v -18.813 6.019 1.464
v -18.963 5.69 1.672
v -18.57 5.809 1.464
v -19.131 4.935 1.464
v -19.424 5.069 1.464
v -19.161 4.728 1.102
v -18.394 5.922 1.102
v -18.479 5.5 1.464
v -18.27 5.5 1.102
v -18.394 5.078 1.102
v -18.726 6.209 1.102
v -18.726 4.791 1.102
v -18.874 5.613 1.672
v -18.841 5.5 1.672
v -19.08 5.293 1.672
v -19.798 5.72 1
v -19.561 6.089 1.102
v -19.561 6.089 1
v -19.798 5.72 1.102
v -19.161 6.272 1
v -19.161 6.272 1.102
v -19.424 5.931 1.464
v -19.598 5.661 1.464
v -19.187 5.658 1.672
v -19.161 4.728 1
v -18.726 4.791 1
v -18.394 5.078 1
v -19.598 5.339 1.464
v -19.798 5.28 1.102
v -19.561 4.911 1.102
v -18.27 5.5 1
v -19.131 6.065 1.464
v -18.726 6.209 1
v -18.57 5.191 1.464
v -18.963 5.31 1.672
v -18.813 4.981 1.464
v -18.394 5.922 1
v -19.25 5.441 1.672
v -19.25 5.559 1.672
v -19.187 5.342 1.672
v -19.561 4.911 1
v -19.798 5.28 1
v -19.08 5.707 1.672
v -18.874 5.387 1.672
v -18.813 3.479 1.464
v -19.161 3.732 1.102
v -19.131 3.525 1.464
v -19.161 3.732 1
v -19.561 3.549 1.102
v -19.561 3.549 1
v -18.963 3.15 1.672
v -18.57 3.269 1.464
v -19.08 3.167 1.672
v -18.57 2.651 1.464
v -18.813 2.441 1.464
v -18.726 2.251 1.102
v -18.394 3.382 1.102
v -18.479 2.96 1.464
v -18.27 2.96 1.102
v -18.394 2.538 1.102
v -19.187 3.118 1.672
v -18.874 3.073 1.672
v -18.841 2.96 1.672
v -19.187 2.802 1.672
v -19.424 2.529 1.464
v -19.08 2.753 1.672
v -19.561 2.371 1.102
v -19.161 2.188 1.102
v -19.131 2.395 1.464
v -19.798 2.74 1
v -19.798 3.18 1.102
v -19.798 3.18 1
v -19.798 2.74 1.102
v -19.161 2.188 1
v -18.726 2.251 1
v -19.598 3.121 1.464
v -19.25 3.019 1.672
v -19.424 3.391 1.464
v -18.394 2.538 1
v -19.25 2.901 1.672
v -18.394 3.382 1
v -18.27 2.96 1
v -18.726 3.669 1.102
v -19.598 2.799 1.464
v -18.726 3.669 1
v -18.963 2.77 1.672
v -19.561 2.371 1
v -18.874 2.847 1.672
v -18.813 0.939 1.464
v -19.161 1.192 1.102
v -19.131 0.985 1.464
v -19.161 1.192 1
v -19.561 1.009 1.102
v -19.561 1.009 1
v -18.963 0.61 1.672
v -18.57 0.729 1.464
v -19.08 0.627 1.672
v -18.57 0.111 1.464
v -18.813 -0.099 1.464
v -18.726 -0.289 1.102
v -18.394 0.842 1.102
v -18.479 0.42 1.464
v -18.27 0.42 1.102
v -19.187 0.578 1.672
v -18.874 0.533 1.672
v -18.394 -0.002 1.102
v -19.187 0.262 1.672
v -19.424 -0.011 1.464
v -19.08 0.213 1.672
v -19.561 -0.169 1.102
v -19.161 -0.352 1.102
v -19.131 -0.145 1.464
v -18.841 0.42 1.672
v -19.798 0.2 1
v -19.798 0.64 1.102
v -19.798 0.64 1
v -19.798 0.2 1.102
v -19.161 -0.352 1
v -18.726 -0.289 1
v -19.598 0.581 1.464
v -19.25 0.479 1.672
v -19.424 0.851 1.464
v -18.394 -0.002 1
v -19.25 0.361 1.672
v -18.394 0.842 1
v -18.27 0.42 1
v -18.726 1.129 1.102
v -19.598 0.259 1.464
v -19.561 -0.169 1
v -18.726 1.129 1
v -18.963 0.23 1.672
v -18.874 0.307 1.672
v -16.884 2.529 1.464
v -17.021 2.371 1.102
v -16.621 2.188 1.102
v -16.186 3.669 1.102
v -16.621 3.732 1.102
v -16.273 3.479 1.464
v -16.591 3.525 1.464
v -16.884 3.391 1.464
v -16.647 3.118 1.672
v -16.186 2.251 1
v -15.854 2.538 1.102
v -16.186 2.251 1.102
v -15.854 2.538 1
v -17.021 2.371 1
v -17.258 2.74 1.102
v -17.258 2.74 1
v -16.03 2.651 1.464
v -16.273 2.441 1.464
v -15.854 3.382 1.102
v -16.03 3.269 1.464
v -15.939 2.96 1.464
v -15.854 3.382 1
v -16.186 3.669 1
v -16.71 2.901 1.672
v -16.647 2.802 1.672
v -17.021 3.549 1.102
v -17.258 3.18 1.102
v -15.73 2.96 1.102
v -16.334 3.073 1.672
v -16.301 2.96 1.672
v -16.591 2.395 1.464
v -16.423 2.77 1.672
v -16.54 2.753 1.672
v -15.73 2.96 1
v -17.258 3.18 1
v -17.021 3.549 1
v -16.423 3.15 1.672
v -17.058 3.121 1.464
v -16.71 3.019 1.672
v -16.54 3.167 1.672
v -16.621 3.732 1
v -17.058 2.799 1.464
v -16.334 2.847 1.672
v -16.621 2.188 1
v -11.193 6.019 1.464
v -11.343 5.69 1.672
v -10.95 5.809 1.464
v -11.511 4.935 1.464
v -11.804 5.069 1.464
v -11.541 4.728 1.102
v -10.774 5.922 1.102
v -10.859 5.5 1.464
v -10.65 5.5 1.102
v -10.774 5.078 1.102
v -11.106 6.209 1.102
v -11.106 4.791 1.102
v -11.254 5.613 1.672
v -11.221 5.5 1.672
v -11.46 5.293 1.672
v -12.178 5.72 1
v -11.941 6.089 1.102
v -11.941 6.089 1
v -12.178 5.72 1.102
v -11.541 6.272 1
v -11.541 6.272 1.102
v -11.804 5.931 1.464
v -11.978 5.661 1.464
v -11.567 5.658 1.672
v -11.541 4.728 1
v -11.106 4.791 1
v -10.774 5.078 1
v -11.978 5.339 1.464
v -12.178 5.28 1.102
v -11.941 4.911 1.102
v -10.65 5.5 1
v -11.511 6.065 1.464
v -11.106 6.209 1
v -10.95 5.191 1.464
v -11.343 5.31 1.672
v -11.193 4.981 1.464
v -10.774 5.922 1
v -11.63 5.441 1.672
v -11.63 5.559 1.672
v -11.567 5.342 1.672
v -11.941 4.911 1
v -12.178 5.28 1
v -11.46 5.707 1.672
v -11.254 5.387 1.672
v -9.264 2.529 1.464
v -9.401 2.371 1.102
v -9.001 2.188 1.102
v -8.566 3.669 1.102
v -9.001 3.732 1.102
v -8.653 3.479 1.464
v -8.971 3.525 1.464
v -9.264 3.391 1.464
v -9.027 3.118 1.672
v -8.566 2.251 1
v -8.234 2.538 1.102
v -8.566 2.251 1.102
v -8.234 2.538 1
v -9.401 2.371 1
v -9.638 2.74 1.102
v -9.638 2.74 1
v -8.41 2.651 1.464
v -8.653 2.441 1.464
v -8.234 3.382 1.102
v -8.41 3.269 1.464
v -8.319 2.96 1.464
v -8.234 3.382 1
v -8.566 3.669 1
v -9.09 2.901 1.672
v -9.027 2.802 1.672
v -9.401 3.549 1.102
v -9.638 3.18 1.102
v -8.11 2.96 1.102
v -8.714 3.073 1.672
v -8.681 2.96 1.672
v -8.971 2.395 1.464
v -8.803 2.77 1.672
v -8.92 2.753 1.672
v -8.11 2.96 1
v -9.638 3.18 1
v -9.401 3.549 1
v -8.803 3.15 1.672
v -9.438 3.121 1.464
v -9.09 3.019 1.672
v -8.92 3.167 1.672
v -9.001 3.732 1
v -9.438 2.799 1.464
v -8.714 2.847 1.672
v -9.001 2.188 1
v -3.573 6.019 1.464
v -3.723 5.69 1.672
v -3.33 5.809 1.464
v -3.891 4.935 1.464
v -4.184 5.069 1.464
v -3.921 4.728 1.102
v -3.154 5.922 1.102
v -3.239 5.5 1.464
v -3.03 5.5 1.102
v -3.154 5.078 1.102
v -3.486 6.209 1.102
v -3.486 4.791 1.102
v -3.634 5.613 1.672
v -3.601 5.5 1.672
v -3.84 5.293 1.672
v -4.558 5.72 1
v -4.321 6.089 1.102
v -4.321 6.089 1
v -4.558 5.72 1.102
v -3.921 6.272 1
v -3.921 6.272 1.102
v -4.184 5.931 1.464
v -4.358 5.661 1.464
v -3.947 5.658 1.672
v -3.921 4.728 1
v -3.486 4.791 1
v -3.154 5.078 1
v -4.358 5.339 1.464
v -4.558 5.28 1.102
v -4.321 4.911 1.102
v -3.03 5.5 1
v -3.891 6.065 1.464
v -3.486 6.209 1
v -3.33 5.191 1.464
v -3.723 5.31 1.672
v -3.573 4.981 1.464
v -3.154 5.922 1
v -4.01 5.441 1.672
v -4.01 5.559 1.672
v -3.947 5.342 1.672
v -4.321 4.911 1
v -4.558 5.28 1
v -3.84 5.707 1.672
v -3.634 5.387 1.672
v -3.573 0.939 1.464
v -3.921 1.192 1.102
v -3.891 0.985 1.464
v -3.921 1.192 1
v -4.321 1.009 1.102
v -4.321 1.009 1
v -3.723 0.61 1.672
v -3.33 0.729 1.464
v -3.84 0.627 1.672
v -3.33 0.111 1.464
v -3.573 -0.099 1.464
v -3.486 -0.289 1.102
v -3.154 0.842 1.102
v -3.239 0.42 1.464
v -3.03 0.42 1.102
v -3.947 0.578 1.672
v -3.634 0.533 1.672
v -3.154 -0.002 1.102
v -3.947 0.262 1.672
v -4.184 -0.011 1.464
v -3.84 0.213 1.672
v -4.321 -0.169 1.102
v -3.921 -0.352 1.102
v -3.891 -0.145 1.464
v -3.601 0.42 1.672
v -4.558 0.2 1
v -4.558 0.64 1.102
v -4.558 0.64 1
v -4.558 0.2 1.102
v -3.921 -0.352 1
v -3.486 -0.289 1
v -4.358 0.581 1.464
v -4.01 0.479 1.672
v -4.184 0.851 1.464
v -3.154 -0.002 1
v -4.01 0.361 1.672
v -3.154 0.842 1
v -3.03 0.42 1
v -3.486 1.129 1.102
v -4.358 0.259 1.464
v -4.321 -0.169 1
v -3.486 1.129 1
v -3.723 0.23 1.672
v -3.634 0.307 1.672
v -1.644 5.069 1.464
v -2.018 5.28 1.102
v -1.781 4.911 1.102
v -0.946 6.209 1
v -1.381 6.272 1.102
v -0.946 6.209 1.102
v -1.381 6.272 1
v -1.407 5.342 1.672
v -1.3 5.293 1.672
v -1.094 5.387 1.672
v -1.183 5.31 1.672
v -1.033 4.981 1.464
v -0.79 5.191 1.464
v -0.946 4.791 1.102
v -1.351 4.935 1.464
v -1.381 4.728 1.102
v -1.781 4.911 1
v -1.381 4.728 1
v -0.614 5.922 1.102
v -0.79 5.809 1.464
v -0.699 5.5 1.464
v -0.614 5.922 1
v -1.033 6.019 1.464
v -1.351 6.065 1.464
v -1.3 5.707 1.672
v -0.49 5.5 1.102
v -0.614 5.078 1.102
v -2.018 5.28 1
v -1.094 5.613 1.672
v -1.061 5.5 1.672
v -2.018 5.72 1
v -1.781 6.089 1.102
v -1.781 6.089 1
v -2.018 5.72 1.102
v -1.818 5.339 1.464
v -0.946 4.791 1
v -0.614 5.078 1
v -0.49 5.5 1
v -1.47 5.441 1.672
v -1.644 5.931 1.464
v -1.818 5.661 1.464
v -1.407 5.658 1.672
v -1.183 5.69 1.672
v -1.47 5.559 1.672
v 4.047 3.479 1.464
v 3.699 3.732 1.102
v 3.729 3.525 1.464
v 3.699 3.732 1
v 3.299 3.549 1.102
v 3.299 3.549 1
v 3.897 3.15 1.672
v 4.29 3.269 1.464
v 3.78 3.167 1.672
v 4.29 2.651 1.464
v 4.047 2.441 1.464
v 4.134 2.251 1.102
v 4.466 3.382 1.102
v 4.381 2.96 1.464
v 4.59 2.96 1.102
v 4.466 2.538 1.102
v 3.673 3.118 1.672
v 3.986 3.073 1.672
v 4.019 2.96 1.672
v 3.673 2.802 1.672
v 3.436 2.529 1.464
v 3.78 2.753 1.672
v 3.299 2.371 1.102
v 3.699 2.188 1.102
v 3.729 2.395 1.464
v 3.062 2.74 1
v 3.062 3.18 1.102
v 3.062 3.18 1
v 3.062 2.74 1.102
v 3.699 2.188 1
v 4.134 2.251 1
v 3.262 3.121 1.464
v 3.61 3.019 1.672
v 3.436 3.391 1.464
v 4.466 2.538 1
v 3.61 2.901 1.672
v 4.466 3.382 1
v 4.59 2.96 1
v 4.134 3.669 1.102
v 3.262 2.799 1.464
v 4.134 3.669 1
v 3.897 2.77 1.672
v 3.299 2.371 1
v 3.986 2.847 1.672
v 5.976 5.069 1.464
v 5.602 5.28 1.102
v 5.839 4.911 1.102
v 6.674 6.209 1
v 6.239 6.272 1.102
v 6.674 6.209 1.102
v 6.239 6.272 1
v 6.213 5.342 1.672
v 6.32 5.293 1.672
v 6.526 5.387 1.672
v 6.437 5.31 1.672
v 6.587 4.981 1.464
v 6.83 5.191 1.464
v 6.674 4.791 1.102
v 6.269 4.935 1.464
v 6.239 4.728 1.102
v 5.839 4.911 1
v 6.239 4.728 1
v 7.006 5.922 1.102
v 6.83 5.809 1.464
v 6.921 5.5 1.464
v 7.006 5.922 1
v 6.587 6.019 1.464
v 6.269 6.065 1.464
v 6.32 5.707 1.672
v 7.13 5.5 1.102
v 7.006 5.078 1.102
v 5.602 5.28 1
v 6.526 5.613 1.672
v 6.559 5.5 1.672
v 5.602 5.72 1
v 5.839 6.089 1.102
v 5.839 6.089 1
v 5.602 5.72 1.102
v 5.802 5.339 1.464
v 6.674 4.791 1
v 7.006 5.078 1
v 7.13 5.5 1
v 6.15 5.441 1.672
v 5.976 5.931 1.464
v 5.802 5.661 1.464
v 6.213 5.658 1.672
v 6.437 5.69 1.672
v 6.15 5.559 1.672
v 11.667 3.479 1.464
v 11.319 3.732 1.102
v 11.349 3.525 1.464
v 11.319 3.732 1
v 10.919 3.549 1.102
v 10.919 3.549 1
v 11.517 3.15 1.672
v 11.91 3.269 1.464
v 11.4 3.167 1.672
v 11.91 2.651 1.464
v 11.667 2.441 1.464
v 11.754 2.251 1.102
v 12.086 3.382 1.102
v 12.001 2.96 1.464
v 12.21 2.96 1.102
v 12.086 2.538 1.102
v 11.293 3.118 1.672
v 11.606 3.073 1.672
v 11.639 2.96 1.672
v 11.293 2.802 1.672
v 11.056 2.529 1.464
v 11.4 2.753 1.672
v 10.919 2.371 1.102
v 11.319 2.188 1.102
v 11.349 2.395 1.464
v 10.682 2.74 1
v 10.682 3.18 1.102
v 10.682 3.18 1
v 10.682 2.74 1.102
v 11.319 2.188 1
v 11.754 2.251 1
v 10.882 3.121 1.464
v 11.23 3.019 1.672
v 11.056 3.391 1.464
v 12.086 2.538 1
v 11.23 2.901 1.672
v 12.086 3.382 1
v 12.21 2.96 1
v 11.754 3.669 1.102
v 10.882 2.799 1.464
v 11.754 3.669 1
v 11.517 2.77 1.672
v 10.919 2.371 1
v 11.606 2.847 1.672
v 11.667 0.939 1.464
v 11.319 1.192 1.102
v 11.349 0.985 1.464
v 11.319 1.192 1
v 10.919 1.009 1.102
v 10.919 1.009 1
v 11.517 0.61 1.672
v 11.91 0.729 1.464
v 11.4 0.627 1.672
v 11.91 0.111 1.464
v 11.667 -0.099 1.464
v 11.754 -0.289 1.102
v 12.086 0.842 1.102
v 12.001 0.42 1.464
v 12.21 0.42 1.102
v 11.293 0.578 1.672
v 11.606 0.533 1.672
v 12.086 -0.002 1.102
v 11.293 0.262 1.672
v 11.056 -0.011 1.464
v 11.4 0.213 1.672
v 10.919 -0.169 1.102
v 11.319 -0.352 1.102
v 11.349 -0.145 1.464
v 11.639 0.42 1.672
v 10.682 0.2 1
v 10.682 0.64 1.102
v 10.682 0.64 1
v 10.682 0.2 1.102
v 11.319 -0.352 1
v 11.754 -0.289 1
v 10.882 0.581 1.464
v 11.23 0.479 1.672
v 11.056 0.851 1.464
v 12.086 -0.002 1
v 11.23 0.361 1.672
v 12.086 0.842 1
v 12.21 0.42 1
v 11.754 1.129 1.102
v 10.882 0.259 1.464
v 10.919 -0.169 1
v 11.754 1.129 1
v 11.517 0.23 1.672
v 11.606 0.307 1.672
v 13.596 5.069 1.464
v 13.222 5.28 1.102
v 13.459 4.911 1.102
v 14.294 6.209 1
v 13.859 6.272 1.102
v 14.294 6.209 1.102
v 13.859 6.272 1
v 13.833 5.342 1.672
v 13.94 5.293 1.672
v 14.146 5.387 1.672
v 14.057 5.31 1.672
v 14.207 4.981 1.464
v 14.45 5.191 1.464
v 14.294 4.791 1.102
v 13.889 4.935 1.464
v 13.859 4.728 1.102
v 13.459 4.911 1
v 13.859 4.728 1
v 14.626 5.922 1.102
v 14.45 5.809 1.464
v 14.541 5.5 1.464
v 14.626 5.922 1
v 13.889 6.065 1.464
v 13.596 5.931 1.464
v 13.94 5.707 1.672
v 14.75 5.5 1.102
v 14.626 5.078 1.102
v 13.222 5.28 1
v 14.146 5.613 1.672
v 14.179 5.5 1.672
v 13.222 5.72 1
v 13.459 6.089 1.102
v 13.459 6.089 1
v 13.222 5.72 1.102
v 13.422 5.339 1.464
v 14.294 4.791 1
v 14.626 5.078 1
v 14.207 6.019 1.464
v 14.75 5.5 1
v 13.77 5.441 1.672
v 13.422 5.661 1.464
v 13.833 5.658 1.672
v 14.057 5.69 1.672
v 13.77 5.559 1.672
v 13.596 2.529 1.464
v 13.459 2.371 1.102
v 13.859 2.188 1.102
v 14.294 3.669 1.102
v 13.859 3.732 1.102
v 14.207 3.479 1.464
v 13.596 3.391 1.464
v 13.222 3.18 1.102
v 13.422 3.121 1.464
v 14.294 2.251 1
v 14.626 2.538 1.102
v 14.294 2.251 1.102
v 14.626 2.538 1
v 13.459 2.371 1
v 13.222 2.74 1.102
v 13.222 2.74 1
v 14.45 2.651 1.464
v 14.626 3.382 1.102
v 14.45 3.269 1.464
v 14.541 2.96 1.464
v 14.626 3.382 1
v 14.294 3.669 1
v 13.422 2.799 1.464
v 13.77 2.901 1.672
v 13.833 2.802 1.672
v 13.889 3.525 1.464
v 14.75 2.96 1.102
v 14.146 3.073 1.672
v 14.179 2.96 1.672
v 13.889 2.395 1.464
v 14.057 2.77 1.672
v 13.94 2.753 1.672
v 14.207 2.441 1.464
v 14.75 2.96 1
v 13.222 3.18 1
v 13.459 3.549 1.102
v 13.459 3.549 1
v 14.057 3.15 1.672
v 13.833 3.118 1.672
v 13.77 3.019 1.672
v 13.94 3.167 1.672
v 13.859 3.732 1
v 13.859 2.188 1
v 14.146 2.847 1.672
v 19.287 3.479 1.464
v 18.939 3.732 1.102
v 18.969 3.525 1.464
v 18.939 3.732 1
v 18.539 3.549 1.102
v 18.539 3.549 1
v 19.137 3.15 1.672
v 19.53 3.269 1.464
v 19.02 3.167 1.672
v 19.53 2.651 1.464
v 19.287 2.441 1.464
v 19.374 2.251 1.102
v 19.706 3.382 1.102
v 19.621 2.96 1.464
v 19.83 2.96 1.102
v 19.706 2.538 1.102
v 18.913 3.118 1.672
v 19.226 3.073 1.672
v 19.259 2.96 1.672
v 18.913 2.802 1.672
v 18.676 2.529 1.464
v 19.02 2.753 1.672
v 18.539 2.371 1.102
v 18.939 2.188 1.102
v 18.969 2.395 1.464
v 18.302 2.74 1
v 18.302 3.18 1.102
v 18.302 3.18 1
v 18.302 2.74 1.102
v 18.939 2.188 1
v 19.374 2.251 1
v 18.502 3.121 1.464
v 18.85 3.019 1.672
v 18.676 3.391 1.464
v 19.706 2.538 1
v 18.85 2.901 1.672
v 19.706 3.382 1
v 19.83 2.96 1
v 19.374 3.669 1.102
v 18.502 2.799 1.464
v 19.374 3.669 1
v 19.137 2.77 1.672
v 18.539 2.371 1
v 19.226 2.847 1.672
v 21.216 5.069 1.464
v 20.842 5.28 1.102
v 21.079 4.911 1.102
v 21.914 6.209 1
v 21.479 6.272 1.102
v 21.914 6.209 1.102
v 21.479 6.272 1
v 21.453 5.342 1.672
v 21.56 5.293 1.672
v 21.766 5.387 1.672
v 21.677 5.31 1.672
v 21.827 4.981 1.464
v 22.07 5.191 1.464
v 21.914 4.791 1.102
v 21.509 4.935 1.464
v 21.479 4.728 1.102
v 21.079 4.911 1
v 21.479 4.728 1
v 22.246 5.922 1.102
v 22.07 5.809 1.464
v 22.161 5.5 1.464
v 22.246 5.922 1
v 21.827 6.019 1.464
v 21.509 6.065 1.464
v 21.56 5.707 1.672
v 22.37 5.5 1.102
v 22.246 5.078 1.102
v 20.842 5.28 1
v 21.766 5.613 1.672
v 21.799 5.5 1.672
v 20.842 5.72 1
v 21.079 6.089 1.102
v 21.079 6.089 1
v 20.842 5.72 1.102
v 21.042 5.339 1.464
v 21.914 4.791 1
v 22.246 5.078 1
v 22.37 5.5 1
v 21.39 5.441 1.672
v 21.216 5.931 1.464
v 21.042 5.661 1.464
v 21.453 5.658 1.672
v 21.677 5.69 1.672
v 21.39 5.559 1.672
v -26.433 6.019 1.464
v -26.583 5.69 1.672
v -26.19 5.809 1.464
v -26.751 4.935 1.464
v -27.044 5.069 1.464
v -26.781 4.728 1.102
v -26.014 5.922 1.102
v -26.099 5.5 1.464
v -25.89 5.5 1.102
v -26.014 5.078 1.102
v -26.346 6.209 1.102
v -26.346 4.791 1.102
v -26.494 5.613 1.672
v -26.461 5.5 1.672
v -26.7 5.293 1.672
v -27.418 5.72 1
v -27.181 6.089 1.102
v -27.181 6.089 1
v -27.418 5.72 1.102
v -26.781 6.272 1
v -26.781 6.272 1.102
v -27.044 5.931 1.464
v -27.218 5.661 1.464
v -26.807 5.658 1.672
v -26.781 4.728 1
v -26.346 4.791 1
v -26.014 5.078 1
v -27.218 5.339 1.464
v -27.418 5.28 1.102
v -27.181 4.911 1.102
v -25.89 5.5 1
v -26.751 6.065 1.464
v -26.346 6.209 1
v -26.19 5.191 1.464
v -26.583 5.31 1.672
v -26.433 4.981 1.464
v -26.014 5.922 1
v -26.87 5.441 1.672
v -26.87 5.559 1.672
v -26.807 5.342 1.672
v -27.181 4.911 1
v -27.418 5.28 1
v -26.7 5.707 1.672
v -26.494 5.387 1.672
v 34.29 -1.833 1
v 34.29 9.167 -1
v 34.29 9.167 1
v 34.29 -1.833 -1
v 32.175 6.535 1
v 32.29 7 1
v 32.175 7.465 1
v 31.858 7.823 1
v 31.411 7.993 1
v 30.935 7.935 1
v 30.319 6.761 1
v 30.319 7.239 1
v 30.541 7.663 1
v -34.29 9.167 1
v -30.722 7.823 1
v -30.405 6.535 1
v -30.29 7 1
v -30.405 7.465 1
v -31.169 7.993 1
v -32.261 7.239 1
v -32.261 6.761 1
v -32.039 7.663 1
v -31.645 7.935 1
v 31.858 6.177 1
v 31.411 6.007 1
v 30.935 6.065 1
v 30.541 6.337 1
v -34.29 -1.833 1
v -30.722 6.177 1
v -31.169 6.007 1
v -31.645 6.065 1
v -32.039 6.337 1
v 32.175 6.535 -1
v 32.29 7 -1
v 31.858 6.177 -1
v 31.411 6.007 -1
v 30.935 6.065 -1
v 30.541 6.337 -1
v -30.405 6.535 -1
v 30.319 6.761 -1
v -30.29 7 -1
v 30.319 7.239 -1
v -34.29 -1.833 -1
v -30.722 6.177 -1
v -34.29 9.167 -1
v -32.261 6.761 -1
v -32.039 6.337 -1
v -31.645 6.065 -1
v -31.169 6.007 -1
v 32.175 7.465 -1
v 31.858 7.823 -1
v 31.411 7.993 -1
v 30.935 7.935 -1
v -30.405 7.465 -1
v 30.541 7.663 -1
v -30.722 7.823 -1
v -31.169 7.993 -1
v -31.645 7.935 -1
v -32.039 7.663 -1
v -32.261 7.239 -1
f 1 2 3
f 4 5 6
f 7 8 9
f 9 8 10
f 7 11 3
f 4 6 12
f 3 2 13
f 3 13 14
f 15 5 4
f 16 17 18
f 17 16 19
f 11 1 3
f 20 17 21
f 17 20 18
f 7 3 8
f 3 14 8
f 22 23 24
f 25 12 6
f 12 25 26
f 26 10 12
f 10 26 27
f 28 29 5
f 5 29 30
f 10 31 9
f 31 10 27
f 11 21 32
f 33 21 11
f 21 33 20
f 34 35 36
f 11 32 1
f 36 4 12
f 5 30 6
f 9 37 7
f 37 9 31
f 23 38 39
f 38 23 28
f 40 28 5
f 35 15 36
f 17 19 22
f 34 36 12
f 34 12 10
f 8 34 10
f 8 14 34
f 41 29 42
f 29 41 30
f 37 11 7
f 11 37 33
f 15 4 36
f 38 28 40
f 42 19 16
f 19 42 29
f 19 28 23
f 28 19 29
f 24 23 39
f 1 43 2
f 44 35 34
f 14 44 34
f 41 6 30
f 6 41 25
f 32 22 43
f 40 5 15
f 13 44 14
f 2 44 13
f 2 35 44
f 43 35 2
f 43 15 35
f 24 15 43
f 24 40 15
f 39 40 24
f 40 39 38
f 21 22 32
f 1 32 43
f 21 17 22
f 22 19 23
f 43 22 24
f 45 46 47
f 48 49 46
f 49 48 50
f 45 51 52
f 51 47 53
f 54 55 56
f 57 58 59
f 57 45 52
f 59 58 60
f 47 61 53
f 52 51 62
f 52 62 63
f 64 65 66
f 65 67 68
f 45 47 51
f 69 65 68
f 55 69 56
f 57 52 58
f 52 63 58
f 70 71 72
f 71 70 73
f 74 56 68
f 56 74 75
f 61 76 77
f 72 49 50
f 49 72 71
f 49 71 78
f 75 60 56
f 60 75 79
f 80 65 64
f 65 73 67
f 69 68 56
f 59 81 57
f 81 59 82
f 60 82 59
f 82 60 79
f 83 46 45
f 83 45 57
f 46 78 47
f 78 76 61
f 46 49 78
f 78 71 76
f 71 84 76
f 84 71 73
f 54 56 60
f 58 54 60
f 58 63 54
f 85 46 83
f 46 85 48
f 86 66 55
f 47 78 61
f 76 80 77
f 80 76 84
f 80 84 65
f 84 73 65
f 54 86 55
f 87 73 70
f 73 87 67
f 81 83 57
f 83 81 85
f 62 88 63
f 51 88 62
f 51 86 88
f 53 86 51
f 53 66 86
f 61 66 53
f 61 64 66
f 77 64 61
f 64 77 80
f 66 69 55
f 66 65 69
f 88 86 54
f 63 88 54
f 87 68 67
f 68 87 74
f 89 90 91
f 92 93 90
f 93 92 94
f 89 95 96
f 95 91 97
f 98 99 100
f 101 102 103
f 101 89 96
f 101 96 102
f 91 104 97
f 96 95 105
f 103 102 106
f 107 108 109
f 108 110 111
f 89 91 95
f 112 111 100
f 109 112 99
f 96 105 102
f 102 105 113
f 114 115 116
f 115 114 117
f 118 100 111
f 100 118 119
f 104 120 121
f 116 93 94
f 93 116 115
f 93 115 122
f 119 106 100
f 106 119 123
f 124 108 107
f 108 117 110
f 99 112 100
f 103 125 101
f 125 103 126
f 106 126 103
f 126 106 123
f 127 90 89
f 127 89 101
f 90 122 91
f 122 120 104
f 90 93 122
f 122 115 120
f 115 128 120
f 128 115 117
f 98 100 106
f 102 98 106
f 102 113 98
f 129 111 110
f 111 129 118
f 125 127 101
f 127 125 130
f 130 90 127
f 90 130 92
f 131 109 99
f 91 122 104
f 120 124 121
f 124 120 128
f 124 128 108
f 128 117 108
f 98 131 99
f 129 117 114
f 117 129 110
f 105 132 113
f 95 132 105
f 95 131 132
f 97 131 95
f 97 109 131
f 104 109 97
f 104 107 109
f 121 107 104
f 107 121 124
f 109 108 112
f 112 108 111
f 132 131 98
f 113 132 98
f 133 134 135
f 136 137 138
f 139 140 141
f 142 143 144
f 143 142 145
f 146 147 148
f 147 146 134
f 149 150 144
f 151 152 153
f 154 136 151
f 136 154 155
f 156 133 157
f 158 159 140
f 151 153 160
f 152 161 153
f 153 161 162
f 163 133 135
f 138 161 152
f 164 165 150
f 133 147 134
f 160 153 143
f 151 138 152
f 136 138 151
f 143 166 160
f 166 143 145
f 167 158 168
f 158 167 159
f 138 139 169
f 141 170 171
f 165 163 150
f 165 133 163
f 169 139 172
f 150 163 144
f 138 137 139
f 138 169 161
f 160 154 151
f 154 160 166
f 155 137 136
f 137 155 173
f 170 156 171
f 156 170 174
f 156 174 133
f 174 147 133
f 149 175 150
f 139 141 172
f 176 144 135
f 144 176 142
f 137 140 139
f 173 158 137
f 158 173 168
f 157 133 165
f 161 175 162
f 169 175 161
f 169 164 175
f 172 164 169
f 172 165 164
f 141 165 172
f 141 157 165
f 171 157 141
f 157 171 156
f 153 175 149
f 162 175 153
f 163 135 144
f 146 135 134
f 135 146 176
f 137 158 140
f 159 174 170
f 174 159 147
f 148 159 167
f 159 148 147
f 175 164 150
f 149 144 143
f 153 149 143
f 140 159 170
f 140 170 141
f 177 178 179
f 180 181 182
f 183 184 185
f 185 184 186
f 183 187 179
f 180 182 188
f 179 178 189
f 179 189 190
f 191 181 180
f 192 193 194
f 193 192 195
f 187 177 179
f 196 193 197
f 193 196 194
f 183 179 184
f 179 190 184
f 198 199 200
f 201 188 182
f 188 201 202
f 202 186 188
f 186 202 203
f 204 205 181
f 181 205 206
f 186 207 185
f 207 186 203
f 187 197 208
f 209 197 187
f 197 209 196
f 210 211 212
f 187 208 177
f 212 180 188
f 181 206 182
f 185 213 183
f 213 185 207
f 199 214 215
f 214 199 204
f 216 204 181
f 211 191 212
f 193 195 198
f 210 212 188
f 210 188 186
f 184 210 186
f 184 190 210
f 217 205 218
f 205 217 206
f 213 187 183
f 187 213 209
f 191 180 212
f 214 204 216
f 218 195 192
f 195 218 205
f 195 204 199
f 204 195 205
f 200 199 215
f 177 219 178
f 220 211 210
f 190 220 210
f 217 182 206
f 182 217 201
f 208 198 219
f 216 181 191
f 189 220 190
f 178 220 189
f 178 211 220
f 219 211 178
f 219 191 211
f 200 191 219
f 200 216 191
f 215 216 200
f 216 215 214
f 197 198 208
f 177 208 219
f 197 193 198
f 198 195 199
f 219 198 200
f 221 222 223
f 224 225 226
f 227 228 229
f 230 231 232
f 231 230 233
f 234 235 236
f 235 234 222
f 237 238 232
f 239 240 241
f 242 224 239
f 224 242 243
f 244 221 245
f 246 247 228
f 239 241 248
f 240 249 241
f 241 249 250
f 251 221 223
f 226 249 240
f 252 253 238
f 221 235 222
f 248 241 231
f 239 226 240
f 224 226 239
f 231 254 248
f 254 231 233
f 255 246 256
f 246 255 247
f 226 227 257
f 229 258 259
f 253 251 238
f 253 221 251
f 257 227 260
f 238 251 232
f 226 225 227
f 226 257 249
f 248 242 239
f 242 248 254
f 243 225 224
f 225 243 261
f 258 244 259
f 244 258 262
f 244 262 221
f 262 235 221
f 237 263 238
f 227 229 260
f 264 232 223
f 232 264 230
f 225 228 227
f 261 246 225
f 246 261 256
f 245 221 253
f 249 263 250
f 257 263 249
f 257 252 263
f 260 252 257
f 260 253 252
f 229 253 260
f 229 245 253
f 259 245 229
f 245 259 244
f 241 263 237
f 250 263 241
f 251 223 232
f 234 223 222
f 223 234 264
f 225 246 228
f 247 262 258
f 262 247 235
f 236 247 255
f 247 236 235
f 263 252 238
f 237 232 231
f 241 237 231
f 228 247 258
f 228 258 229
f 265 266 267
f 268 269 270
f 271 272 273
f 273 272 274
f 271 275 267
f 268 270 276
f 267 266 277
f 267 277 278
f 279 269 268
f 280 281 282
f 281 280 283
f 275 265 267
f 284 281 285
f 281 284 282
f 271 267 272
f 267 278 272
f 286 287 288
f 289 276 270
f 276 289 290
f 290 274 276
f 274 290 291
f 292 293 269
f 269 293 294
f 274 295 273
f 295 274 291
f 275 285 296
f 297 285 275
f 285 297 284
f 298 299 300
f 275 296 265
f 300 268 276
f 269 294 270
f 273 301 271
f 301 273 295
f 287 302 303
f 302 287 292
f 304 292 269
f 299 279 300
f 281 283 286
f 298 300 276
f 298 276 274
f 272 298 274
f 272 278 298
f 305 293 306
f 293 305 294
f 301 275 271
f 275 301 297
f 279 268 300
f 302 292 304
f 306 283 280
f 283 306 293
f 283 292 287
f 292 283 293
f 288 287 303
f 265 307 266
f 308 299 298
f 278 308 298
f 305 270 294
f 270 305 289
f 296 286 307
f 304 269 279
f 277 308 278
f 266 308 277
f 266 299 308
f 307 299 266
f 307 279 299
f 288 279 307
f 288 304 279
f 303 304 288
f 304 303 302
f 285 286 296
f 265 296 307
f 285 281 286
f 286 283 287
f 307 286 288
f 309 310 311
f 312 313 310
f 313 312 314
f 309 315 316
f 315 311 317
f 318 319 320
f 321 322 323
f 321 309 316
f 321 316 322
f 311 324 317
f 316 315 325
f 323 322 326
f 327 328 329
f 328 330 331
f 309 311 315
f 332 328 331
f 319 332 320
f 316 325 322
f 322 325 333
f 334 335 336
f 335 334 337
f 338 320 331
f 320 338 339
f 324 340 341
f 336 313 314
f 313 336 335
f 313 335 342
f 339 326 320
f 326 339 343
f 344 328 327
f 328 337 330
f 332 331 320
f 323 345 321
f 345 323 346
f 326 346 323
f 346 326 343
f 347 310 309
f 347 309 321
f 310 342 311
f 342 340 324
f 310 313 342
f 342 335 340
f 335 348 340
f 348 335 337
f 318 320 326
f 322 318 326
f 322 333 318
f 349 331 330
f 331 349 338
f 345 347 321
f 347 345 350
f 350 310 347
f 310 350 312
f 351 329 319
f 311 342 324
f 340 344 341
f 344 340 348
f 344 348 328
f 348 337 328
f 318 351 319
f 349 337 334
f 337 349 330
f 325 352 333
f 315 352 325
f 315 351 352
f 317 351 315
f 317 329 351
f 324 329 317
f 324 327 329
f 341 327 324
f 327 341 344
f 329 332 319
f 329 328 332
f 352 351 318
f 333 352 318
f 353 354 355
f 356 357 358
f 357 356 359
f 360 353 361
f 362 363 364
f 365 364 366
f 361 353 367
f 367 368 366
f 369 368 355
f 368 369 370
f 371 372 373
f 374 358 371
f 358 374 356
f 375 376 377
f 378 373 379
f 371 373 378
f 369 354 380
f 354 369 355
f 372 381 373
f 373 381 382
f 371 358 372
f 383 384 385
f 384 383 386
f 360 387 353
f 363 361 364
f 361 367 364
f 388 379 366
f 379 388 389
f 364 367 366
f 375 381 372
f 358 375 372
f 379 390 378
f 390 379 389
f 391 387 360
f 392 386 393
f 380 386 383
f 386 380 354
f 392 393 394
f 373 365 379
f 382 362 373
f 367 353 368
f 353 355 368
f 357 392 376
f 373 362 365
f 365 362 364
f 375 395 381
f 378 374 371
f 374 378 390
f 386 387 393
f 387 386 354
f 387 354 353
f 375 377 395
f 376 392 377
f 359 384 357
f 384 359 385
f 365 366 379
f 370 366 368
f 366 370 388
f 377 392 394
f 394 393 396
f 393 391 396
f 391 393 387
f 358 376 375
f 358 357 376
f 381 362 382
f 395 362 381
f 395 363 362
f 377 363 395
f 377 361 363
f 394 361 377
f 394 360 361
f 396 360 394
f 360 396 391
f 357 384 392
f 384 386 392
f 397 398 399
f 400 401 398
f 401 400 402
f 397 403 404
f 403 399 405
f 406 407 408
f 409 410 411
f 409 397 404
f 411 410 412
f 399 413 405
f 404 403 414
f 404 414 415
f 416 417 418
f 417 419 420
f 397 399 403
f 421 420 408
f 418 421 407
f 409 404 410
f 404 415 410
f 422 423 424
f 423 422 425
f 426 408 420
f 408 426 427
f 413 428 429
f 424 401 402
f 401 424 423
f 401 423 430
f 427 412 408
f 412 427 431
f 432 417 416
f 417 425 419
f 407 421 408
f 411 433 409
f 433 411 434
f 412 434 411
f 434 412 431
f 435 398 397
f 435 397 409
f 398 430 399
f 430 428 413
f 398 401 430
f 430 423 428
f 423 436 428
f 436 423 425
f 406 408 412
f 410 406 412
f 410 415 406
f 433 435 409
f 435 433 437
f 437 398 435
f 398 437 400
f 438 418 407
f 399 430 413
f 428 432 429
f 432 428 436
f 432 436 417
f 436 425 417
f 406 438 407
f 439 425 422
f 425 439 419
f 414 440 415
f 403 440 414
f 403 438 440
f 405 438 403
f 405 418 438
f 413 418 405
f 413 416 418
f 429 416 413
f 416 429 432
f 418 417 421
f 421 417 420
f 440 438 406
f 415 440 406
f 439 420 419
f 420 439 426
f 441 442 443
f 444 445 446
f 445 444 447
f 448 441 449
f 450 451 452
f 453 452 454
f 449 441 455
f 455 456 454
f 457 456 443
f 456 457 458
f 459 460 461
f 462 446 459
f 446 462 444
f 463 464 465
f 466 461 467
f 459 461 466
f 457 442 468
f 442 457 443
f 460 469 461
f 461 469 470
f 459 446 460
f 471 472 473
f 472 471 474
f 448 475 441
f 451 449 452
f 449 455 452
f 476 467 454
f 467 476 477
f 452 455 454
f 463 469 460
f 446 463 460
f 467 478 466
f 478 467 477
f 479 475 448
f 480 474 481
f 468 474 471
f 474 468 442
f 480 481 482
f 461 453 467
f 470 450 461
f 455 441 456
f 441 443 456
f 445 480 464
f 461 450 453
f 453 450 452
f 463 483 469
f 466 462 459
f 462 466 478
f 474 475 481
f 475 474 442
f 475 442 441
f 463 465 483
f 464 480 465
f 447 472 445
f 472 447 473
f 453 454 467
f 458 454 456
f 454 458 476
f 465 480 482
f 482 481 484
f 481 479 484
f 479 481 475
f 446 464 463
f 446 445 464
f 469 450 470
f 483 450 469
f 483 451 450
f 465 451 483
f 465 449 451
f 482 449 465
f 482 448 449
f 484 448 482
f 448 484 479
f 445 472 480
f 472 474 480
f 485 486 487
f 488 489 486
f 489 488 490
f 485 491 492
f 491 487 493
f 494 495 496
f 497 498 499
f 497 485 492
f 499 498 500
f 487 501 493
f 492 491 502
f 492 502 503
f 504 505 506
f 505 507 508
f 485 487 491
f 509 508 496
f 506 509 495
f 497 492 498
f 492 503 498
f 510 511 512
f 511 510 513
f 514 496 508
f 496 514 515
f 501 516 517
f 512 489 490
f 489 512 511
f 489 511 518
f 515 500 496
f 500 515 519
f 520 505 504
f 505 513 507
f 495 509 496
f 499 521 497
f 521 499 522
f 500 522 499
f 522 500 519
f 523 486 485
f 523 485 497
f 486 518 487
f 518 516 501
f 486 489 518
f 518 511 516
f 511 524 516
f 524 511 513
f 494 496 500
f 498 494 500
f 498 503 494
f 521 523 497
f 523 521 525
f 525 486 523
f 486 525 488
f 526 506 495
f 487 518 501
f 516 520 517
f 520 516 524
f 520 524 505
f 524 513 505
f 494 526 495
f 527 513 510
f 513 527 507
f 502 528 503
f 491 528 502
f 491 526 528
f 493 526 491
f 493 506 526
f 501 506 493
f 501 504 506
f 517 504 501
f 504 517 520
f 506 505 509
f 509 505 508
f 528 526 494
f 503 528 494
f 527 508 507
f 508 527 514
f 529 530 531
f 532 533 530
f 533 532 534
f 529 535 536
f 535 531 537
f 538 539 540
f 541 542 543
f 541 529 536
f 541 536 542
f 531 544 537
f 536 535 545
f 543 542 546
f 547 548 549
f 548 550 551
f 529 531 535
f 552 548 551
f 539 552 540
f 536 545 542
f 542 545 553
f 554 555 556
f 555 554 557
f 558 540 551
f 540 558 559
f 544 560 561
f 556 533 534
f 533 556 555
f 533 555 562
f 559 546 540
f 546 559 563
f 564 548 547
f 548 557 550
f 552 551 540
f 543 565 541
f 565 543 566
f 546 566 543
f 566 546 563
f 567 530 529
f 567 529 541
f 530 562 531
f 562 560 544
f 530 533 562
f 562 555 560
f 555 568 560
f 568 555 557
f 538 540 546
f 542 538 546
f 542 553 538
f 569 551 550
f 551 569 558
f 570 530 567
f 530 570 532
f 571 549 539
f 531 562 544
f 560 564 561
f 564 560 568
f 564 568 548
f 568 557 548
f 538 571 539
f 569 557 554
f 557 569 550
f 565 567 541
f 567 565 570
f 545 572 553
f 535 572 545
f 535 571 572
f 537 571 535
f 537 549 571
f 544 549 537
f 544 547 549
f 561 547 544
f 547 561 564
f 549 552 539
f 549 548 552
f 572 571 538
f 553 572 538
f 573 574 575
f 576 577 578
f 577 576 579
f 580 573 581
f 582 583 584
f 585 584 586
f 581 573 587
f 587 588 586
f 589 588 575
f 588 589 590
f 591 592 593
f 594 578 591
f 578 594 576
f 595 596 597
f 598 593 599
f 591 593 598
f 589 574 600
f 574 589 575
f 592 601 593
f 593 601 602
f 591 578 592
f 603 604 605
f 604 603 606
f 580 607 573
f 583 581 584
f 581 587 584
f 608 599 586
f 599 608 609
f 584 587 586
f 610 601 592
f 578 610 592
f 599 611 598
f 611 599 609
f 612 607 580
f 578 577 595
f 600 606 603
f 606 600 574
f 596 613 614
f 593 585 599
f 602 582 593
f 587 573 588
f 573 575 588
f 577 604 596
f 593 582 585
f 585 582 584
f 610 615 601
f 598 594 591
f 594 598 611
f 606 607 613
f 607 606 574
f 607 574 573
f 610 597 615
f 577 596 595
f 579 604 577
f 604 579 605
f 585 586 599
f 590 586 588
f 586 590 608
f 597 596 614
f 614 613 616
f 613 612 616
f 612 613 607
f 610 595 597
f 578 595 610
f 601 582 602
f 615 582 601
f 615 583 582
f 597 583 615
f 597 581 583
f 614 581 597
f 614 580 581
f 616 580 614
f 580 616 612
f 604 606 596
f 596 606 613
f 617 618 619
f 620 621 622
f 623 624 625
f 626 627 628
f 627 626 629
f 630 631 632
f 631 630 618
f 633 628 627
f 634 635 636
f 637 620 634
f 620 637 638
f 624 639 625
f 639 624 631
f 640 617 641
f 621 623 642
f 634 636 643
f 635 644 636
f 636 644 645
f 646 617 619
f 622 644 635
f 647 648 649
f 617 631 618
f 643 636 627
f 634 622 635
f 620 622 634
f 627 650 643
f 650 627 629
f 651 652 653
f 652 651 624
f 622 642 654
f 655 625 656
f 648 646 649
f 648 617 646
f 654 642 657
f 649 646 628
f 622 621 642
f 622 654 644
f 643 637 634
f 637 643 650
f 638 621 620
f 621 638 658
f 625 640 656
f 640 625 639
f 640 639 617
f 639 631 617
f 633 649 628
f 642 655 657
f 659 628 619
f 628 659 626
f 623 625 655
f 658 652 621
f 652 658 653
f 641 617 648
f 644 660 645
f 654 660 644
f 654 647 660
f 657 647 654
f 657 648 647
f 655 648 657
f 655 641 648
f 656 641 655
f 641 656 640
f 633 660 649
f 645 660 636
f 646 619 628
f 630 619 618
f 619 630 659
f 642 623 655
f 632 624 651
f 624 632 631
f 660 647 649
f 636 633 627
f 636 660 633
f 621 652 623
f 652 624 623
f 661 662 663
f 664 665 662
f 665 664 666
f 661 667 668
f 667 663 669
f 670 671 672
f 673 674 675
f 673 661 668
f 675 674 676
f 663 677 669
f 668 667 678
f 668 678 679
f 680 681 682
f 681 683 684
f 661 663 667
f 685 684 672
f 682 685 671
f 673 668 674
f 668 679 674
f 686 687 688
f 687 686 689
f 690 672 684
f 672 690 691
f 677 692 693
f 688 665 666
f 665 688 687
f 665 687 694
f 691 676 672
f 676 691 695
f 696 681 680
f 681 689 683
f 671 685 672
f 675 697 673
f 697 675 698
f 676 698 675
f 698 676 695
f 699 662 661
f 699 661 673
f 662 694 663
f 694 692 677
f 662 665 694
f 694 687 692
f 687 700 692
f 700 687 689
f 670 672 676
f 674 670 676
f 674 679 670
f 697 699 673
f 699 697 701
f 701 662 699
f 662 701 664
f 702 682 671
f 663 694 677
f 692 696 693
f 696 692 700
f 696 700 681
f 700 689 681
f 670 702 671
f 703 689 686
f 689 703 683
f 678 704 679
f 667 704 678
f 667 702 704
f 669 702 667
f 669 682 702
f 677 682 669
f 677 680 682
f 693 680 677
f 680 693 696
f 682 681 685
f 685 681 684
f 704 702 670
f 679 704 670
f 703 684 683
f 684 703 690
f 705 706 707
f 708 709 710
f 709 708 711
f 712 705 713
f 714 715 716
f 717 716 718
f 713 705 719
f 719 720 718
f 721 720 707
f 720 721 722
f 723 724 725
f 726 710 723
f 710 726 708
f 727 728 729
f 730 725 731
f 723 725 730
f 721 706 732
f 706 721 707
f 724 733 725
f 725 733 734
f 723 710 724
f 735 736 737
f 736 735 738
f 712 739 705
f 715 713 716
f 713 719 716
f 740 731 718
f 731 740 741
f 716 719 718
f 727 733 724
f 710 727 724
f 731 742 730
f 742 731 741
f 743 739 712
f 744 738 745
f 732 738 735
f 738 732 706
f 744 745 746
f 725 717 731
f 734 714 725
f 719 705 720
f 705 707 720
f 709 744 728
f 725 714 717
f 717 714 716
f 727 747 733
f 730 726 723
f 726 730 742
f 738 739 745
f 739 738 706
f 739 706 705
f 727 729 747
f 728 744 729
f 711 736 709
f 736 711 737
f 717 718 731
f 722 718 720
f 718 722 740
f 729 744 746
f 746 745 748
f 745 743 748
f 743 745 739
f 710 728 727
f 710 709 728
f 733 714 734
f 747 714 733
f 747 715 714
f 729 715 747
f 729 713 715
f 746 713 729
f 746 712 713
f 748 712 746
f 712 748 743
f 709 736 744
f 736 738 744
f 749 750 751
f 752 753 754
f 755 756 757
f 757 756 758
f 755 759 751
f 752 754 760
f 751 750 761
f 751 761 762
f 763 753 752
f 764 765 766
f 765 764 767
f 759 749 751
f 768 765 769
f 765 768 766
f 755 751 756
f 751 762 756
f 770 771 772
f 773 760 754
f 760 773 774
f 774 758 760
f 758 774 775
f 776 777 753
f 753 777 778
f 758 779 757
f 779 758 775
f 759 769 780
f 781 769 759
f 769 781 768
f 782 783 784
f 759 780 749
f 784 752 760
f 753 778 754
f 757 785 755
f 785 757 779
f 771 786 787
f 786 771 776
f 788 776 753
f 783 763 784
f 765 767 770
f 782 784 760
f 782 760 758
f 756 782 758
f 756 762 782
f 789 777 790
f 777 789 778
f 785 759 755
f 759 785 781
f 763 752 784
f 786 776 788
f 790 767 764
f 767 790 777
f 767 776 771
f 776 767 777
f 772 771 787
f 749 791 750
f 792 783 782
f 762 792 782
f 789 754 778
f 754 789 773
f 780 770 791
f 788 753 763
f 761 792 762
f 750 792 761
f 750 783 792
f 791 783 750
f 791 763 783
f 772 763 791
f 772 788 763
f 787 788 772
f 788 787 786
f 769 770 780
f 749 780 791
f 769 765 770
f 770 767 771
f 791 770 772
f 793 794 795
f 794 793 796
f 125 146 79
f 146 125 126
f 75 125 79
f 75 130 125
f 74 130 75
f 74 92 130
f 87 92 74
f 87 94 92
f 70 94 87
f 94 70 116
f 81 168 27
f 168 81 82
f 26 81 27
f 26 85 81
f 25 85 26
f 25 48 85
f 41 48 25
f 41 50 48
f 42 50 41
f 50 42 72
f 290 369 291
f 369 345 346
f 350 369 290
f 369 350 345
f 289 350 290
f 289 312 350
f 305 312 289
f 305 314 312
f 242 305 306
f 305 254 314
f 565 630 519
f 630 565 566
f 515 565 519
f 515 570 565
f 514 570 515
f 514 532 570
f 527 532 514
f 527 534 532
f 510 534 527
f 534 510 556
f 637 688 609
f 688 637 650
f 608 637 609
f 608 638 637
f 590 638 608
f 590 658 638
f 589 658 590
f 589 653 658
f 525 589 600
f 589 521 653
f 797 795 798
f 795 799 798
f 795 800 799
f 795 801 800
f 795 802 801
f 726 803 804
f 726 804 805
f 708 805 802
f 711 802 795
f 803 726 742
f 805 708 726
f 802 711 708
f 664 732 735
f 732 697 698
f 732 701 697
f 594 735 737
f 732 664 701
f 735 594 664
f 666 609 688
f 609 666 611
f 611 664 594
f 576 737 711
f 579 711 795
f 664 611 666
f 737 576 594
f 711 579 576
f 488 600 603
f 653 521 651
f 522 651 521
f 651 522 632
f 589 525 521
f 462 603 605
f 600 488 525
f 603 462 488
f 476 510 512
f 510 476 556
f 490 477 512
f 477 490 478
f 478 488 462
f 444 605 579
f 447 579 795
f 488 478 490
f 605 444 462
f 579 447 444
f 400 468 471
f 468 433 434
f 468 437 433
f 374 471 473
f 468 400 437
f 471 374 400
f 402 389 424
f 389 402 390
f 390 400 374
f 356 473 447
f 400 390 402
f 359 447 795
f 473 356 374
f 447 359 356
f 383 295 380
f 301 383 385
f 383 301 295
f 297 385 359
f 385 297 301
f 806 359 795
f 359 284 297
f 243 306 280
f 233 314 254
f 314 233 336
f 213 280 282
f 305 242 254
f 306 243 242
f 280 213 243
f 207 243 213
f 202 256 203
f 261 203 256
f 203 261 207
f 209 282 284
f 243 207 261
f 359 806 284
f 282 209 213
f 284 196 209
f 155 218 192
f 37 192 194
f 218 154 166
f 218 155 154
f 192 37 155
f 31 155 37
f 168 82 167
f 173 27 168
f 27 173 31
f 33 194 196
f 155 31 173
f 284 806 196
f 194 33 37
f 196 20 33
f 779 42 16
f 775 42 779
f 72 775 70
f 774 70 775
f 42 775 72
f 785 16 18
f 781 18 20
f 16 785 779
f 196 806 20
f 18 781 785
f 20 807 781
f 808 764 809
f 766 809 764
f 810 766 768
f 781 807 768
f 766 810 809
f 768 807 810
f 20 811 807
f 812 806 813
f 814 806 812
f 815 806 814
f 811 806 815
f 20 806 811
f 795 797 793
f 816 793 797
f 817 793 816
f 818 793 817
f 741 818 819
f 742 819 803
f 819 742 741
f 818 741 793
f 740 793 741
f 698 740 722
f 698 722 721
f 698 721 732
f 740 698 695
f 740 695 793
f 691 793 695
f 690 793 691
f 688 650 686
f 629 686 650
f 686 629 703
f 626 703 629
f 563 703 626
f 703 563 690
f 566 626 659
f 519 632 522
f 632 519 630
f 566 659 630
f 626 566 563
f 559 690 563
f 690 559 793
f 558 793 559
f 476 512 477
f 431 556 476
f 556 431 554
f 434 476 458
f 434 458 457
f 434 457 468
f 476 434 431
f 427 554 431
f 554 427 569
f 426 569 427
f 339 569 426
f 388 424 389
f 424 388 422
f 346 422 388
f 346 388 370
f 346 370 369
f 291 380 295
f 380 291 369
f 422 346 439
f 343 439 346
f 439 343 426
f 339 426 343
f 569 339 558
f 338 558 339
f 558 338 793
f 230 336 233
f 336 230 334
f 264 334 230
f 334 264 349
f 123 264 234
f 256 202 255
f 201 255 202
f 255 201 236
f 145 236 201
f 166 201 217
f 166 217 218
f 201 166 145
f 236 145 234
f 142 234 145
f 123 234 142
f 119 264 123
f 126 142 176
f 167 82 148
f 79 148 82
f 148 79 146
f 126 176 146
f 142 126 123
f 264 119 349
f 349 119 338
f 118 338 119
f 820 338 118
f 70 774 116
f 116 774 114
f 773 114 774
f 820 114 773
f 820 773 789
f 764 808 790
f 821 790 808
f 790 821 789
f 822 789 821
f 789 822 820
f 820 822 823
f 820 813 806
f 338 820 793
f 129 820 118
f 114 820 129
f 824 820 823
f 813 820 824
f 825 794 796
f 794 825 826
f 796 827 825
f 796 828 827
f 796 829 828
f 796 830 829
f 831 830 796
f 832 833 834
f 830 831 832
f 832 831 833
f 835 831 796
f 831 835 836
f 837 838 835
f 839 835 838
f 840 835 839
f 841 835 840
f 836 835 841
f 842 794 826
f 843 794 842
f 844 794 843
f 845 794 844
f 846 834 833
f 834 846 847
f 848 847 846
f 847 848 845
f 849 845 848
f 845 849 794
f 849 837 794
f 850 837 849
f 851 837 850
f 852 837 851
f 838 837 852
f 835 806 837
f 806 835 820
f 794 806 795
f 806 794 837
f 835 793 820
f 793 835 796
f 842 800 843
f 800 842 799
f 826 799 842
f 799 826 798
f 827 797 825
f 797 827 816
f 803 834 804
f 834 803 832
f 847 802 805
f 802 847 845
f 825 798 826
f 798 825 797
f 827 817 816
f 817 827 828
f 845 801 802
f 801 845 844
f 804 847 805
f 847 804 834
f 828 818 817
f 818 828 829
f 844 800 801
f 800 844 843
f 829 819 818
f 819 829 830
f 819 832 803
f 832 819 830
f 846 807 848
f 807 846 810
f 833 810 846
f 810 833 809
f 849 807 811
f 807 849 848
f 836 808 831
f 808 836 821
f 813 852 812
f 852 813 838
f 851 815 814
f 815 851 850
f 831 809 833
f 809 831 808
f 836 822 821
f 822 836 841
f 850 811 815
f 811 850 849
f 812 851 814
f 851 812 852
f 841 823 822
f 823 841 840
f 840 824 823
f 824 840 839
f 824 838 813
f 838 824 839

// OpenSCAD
/*
  based on http://www.thingiverse.com/thing:8000
  mods : 
              braille font parameters set as global variables (prefixed font_) for clarity
              resolution set globally
              module for printing the label, multiple lines -drawText() - as well as a line - drawLine() 
              dropped the difference operation when drawing dots since embedded in slab anyway
              dot sphere offset because spec requires base which is longer than 2 times the height 
              functions added to compute the radius from a chord length and height
              length() > len()
              max line length calculated with recursive function so width of slab 
                     can be calculated     
              fixing holes at the top added so the fitter  knows which way up it goes 
              braille parameters larger for signage

   todo      allow capitials -openSCAD lacks a function to change the case of a letter, 
                    hence the duplicate entries for both forms of the letter
                    adding the shift character for an uppercase letter is tricky since cannot simply 
                    accumulate the length printed  
             use search instead of looping throught the parallel array for easier maintenance 

*/


function max_length_r(v, i, max) =
     i == len(v) ? max : max_length_r(v, i+1, len(v[i]) > max ? len(v[i]) : max);

function max_length(v) = max_length_r(v,0,0);

// dot is not a hemisphere 

function chord_radius(length,height) = ( length * length /(4 * height) + height)/2;

font_charKeys = ["a", "A", "b", "B", "c", "C", "d", "D", "e", "E", "f", "F", "g", "G", "h", "H", "i", "I", "j", "J", "k", "K", "l", "L", "m", "M", "n", "N", "o", "O", "p", "P", "q", "Q", "r", "R", "s", "S", "t", "T", "u", "U", "v", "V", "w", "W", "x", "X", "y", "Y", "z", "Z", ",", ";", ":", ".", "!", "(", ")", "?", "\"", "*", "'", "-"];

font_charValues = [[1], [1], [1, 2], [1, 2], [1, 4], [1, 4], [1, 4, 5], [1, 4, 5], [1, 5], [1, 5], [1, 2, 4], [1, 2, 4], [1, 2, 4, 5], [1, 2, 4, 5], [1, 2, 5], [1, 2, 5], [2, 4], [2, 4], [2, 4, 5], [2, 4, 5], [1, 3], [1, 3], [1, 2, 3], [1, 2, 3], [1, 3, 4], [1, 3, 4], [1, 3, 4, 5], [1, 3, 4, 5], [1, 3, 5], [1, 3, 5], [1, 2, 3, 4], [1, 2, 3, 4], [1, 2, 3, 4, 5], [1, 2, 3, 4, 5], [1, 2, 3, 5], [1, 2, 3, 5], [2, 3, 4], [2, 3, 4], [2, 3, 4, 5], [2, 3, 4, 5], [1, 3, 6], [1, 3, 6], [1, 2, 3, 6], [1, 2, 3, 6], [2, 4, 5, 6], [2, 4, 5, 6], [1, 3, 4, 6], [1, 3, 4, 6], [1, 3, 4, 5, 6], [1, 3, 4, 5, 6], [1, 3, 5, 6], [1, 3, 5, 6], [2], [2, 3], [2, 5], [2, 5, 6], [2, 3, 5], [2, 3, 5, 6], [2, 3, 5, 6], [2, 3, 6], [2, 3, 6], [3, 5], [3], [3, 6]];


module drawDot(location) {	
    translate(location) 
	   translate ([0,0, -font_dotSphereOffset ]) sphere(font_dotSphereRadius);
}

module drawCharacter(charMap) {
     for(i = [0: len(charMap)-1]) 
          assign(dot = charMap[i] - 1)
	     drawDot(   [floor(dot / 3) * font_dotWidth,  -((dot %3) * font_dotWidth),   0],  font_dotRadius  );
}


module drawLine(line) {
    for(i = [0: len(line)-1]) 	
   	translate([font_charWidth*i, 0, 0]) 	
	   for(j = [0:len(font_charKeys)]) 
		if(font_charKeys[j] == line[i]) 
		    drawCharacter(font_charValues[j]);
			                  	
}

module drawText(text) {
    assign(totalHeight = len(text) * font_lineHeight)
      translate([0, 0, 1])	
        for(i = [0: len(text)]) 
	    translate([-len(text[i])*font_charWidth/2, totalHeight/2-font_lineHeight*i, 0])
	        drawLine(text[i]);
}

module label(text, depth=2) {
     assign(width =( max_length(text) + 2)  * font_charWidth,
                 height = len(text)  * font_lineHeight )
 
     difference () {
        union() {
            translate([0, font_lineHeight/3, 0])
                cube([width,height, depth], true);
           drawText(text);
          }
         translate([width/2-3 ,height-4,-5]) cylinder(r=1,h=10);
         translate([-(width/2-3) ,height-4,-5]) cylinder(r=1,h=10);  
    }
}

$fa = 0.01; $fs = 0.5; 

// global dimensions from http://www.brailleauthority.org/sizespacingofbraille/sizespacingofbraille.pdf

// these dimensions for signage

font_dotHeight = 0.7;
font_dotBase = 1.6;  
font_dotRadius = font_dotBase /2;
font_dotWidth= 2.54;
font_charWidth = 7.62;
font_lineHeight = 11; 

// compute the sphere to make the raised dot
font_dotSphereRadius  =  chord_radius(font_dotBase,font_dotHeight);
font_dotSphereOffset =font_dotSphereRadius - font_dotHeight;

text = ["Aremiti"]; 

// text = ["All human beings are born", "free and equal in dignity and", "rights. They are endowed with", "reason and conscience and", "should act towards one another", "in a spirit of brotherhood."]; 

label(text);
